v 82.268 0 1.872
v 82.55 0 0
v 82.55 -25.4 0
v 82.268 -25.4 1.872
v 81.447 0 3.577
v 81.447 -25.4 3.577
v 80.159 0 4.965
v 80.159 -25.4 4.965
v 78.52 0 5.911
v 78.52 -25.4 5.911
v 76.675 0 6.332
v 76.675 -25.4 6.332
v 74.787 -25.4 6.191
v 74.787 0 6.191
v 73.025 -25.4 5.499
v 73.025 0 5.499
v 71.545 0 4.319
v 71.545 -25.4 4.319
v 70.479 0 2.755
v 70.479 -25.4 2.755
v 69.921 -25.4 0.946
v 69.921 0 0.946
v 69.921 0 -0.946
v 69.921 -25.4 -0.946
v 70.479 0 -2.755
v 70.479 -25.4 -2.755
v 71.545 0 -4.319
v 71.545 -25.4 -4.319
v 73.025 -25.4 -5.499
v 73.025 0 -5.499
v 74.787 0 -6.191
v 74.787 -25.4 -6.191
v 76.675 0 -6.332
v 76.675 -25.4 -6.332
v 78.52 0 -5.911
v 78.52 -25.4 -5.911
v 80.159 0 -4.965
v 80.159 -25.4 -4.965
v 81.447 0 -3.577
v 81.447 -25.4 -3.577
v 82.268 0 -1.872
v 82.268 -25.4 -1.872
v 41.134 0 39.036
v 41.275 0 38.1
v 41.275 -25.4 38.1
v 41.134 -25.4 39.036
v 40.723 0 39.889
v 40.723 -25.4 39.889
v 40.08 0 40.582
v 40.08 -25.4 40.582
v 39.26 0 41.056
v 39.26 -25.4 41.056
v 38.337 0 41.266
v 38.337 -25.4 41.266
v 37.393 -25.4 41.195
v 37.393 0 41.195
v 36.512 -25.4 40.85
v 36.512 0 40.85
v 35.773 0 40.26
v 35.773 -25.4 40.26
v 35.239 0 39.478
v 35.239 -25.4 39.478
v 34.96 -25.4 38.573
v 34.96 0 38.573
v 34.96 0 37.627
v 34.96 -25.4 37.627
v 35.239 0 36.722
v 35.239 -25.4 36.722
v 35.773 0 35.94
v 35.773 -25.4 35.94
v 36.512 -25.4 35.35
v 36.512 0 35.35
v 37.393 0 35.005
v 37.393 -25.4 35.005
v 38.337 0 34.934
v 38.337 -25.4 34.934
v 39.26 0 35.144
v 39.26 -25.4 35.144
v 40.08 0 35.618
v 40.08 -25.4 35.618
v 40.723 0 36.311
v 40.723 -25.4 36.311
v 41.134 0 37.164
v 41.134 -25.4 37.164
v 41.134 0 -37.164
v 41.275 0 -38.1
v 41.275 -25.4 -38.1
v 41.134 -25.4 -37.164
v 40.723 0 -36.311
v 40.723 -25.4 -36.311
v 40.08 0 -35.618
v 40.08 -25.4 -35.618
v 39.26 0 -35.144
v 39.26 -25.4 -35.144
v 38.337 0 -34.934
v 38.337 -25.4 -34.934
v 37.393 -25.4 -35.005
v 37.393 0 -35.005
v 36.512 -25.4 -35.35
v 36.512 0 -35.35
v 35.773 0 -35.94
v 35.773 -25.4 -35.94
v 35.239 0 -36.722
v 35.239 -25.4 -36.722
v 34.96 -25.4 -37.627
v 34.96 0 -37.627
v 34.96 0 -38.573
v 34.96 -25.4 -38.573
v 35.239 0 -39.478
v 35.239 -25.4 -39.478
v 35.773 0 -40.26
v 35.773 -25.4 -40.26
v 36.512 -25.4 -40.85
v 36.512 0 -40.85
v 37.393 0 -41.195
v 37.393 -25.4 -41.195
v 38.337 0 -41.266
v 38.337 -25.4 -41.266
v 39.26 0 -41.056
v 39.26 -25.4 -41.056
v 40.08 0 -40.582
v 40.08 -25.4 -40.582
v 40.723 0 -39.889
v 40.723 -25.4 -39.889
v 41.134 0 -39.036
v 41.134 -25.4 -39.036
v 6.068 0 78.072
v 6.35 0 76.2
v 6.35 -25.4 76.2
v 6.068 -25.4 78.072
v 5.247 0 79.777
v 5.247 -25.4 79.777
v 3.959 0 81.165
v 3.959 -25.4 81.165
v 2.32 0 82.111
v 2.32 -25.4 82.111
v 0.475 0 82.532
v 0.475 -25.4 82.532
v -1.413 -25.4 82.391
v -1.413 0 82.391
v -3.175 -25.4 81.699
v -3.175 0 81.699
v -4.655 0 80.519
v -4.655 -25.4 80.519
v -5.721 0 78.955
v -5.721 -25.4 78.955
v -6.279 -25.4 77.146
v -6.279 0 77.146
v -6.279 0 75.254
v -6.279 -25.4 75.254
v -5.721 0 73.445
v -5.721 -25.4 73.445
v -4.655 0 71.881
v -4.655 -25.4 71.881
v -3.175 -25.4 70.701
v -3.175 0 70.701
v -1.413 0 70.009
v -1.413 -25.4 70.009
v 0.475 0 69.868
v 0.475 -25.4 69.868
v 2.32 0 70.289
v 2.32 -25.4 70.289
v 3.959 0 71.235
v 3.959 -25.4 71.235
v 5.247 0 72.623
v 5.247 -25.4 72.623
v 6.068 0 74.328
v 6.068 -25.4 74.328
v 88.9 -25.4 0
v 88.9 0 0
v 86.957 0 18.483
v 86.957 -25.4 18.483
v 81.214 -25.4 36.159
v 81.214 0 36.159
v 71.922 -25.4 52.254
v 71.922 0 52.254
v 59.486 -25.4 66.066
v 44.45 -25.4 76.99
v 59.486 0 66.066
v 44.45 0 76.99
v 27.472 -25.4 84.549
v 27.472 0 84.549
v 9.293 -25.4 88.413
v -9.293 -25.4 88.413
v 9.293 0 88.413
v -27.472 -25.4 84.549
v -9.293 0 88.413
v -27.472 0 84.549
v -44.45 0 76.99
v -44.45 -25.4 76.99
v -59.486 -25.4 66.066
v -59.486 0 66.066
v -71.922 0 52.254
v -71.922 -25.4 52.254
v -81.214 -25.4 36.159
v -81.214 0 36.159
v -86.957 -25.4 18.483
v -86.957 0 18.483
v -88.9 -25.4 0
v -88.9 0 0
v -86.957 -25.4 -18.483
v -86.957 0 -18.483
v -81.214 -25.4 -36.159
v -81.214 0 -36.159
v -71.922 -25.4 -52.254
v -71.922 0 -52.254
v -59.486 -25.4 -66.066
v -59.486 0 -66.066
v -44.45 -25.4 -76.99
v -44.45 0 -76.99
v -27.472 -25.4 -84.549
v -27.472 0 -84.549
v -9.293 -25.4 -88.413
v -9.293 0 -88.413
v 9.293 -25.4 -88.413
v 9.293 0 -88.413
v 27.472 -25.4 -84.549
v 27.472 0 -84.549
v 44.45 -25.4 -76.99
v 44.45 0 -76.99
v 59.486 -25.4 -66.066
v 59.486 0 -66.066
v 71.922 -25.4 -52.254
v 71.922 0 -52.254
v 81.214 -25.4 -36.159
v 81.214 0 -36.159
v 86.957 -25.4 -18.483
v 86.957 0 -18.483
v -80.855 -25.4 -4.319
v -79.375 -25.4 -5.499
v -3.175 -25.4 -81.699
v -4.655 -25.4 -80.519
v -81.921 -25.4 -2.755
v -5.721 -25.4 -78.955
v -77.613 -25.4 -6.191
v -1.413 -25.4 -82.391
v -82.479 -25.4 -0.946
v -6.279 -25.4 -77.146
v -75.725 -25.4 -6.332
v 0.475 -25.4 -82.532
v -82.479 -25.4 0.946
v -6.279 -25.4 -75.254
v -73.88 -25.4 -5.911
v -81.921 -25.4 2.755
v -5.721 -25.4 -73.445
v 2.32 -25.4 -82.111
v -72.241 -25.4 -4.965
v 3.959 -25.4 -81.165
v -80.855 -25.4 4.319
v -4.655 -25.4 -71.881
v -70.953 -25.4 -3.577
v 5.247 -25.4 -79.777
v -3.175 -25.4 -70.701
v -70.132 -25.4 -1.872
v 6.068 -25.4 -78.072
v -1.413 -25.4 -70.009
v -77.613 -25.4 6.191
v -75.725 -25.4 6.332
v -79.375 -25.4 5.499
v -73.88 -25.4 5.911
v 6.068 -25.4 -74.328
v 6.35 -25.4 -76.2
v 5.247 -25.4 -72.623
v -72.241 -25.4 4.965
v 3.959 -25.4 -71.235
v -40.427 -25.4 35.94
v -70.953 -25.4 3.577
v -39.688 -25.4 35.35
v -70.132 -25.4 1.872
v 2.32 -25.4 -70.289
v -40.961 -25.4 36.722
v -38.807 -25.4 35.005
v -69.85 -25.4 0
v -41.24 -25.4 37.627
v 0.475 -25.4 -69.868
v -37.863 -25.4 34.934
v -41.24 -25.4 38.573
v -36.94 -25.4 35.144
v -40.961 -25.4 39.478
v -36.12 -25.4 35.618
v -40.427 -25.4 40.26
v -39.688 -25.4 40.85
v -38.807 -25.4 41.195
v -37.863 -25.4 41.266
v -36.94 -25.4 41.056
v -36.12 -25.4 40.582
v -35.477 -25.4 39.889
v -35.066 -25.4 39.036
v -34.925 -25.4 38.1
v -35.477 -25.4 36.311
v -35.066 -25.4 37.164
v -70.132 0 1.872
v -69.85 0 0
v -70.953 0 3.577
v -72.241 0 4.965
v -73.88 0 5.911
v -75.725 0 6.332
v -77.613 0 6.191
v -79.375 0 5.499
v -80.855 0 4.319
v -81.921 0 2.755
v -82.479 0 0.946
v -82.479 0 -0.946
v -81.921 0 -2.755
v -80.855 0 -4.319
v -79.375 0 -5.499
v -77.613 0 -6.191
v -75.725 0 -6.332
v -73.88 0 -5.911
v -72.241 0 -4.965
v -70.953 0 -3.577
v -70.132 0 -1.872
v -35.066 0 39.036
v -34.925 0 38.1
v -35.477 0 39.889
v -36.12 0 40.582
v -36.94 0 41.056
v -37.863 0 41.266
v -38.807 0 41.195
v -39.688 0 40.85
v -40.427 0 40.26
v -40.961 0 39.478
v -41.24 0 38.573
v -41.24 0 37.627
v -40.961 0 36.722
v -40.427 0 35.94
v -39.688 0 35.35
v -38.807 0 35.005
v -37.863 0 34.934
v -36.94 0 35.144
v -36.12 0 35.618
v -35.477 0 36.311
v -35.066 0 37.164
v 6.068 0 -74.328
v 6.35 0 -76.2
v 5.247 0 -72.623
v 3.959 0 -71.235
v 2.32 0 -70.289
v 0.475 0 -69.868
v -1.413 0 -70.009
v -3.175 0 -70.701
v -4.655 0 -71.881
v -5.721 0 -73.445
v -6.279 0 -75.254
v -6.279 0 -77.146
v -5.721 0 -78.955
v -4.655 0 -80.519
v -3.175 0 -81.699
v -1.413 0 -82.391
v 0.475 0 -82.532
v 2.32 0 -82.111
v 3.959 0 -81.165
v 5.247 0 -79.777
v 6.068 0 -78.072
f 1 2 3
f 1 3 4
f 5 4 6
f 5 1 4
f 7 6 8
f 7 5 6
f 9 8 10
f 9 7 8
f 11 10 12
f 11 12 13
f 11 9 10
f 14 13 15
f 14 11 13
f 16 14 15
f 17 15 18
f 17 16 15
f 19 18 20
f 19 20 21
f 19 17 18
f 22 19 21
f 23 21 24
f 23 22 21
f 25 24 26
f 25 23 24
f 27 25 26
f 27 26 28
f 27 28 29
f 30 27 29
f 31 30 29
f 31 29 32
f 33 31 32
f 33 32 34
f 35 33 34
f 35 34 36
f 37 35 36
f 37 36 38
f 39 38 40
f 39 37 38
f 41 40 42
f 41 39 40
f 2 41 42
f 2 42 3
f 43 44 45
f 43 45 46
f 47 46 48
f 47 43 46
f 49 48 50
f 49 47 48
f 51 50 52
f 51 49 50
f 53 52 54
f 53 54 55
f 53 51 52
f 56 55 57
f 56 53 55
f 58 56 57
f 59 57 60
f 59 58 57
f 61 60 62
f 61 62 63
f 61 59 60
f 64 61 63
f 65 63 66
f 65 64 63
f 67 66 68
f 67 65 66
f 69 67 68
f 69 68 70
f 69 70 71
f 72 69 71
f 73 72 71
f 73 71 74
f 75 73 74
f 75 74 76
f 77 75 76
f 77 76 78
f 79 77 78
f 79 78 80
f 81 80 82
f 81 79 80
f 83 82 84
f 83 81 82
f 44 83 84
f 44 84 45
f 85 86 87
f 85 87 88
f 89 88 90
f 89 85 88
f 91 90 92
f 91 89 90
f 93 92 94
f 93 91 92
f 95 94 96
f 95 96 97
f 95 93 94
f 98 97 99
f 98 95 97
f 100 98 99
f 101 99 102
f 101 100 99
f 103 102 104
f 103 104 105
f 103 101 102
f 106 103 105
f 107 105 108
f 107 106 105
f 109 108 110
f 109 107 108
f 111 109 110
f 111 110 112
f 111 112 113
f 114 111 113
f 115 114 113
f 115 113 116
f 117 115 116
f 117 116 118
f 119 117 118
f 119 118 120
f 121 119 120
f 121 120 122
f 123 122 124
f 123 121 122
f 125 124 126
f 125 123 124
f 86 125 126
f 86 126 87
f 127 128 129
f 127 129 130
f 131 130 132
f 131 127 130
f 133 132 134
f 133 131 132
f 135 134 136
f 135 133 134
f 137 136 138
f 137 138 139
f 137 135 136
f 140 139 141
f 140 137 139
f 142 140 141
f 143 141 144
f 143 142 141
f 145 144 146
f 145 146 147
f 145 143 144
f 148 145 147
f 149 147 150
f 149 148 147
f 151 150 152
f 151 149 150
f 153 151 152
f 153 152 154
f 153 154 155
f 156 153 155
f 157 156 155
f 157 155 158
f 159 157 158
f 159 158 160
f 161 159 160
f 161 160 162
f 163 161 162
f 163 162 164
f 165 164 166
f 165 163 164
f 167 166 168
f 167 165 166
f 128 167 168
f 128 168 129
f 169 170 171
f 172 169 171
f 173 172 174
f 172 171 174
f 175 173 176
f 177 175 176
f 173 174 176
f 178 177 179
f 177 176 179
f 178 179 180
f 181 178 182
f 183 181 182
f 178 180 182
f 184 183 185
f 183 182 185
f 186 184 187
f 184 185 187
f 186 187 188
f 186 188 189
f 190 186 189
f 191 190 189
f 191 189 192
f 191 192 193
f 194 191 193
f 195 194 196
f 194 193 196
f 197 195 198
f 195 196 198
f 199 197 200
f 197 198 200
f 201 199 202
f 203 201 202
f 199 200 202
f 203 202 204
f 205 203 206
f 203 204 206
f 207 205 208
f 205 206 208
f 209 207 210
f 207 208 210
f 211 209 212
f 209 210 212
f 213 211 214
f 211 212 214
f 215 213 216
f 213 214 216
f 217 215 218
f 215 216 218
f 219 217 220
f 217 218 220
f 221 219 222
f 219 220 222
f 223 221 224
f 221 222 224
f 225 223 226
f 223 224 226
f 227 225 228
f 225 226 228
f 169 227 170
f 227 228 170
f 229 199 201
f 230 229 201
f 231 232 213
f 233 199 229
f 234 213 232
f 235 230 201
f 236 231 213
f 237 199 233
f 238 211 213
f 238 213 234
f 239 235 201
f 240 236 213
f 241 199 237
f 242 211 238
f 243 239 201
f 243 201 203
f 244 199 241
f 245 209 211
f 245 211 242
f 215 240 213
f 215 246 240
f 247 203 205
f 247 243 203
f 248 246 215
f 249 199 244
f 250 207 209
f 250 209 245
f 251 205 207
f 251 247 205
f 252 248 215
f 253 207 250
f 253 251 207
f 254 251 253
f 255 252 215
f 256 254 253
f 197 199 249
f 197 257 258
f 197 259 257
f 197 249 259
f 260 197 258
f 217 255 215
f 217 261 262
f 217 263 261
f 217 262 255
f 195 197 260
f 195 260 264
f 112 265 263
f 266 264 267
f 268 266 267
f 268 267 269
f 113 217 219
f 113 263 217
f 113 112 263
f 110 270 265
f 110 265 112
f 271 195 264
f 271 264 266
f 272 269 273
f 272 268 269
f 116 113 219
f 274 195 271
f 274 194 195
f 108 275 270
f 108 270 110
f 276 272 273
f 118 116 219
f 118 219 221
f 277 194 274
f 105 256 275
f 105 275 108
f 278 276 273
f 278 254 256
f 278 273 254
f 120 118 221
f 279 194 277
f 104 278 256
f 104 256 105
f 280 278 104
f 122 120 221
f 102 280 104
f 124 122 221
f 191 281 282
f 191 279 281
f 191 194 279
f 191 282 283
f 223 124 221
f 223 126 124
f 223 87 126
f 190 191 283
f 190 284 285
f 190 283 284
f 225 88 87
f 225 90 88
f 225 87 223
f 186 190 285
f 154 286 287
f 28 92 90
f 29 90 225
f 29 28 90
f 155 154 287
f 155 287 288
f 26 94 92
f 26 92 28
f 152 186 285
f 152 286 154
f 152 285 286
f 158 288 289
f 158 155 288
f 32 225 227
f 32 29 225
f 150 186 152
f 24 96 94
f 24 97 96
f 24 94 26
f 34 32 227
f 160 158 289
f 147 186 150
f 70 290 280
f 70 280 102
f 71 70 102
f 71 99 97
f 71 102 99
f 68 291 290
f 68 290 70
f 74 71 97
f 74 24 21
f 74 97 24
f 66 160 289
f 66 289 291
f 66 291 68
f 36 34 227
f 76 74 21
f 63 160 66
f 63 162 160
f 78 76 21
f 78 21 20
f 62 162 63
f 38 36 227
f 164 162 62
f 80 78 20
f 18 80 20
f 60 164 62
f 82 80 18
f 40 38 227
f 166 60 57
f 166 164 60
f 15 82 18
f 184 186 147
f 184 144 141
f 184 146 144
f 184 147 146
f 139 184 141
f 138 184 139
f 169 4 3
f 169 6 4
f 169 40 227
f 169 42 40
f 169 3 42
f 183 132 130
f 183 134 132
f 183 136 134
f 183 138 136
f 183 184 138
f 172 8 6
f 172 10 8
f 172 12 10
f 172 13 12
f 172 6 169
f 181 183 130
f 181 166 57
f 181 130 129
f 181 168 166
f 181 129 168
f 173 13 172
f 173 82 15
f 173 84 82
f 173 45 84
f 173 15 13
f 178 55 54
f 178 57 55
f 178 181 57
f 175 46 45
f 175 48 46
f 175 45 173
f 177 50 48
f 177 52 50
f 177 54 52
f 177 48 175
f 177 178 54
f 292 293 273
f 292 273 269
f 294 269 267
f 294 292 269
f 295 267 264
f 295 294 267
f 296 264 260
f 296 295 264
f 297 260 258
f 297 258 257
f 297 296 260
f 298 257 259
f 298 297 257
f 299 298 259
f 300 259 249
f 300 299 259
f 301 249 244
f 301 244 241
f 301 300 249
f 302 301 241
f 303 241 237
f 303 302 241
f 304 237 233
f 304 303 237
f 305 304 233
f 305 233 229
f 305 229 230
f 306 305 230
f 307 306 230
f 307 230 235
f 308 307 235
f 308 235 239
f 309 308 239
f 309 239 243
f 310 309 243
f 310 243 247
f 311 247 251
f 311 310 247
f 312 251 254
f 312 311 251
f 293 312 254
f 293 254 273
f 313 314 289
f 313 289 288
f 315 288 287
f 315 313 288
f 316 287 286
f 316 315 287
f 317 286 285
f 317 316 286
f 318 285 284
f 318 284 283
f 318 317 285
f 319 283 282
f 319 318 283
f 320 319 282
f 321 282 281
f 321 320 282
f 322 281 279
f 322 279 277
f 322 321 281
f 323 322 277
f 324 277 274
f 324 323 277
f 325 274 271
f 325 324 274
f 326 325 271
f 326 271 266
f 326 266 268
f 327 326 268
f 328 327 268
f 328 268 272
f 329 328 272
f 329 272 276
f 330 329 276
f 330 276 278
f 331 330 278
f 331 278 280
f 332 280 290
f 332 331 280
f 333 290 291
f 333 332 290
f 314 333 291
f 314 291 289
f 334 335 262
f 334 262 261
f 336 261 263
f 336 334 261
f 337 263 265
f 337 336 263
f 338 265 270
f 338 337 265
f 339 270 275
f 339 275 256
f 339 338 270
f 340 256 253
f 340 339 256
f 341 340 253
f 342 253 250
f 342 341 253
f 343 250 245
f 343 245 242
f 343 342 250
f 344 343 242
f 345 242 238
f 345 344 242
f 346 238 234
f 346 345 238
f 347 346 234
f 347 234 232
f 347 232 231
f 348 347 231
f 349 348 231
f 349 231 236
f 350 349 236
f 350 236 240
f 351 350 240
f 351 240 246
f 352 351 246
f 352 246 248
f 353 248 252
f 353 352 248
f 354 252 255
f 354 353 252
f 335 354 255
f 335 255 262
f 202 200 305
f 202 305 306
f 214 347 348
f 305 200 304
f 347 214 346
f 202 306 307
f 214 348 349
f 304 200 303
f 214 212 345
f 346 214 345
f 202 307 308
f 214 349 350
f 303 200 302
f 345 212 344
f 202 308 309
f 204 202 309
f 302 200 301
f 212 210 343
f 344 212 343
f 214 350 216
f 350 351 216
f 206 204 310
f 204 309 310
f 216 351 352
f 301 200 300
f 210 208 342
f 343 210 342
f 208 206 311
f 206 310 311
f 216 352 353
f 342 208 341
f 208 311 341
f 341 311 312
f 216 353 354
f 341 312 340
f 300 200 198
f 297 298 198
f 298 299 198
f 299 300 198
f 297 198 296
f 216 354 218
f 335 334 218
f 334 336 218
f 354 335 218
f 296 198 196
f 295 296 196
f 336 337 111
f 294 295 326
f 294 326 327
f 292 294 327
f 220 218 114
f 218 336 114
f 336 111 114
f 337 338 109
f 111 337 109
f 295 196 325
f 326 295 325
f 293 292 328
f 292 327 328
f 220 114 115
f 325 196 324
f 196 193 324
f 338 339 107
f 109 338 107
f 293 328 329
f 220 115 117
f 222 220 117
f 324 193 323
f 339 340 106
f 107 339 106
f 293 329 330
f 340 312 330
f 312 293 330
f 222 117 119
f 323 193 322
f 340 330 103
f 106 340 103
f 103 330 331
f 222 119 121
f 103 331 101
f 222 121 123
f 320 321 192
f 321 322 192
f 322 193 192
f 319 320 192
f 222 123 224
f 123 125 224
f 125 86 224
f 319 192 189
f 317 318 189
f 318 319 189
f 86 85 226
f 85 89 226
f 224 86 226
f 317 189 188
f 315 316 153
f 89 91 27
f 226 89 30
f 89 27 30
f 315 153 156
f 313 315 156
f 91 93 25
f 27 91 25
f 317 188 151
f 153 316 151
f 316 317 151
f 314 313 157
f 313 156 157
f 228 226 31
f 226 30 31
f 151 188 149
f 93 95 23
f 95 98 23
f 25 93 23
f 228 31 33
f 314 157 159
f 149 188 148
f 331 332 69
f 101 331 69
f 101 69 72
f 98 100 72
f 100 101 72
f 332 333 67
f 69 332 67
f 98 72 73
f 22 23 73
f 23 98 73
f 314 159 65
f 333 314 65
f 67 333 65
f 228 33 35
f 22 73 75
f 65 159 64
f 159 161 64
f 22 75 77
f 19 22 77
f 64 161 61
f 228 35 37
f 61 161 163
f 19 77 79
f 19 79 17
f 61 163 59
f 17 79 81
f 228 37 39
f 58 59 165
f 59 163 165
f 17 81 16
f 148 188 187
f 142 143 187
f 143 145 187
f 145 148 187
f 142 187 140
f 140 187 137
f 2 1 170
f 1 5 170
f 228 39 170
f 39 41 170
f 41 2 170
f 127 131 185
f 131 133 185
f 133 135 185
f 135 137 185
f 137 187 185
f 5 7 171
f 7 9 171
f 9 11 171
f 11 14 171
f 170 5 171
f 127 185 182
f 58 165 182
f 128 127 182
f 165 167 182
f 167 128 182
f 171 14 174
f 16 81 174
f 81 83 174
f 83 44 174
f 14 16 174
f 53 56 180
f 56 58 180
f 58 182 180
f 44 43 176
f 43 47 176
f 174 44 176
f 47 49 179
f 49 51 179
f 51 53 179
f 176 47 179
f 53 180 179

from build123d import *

# Parameters (mm, degrees)
F0_R     = 88.9
F0_R_2   = 6.35
F0_R_3   = 3.175
F1_DEPTH = 25.4


with BuildPart() as f1:
    # F0 (on Front) → F1 (new body)
    with BuildSketch(Plane.XZ):
        Circle(F0_R)
        with Locations((0, -76.2)):
            Circle(F0_R_2, mode=Mode.SUBTRACT)
        with Locations((38.1, -38.1)):
            Circle(F0_R_3, mode=Mode.SUBTRACT)
        with Locations((-76.2, 0)):
            Circle(F0_R_2, mode=Mode.SUBTRACT)
        with Locations((-38.1, 38.1)):
            Circle(F0_R_3, mode=Mode.SUBTRACT)
        with Locations((38.1, 38.1)):
            Circle(F0_R_3, mode=Mode.SUBTRACT)
        with Locations((76.2, 0)):
            Circle(F0_R_2, mode=Mode.SUBTRACT)
        with Locations((0, 76.2)):
            Circle(F0_R_2, mode=Mode.SUBTRACT)
    extrude(amount=F1_DEPTH)


solid = f1.part
